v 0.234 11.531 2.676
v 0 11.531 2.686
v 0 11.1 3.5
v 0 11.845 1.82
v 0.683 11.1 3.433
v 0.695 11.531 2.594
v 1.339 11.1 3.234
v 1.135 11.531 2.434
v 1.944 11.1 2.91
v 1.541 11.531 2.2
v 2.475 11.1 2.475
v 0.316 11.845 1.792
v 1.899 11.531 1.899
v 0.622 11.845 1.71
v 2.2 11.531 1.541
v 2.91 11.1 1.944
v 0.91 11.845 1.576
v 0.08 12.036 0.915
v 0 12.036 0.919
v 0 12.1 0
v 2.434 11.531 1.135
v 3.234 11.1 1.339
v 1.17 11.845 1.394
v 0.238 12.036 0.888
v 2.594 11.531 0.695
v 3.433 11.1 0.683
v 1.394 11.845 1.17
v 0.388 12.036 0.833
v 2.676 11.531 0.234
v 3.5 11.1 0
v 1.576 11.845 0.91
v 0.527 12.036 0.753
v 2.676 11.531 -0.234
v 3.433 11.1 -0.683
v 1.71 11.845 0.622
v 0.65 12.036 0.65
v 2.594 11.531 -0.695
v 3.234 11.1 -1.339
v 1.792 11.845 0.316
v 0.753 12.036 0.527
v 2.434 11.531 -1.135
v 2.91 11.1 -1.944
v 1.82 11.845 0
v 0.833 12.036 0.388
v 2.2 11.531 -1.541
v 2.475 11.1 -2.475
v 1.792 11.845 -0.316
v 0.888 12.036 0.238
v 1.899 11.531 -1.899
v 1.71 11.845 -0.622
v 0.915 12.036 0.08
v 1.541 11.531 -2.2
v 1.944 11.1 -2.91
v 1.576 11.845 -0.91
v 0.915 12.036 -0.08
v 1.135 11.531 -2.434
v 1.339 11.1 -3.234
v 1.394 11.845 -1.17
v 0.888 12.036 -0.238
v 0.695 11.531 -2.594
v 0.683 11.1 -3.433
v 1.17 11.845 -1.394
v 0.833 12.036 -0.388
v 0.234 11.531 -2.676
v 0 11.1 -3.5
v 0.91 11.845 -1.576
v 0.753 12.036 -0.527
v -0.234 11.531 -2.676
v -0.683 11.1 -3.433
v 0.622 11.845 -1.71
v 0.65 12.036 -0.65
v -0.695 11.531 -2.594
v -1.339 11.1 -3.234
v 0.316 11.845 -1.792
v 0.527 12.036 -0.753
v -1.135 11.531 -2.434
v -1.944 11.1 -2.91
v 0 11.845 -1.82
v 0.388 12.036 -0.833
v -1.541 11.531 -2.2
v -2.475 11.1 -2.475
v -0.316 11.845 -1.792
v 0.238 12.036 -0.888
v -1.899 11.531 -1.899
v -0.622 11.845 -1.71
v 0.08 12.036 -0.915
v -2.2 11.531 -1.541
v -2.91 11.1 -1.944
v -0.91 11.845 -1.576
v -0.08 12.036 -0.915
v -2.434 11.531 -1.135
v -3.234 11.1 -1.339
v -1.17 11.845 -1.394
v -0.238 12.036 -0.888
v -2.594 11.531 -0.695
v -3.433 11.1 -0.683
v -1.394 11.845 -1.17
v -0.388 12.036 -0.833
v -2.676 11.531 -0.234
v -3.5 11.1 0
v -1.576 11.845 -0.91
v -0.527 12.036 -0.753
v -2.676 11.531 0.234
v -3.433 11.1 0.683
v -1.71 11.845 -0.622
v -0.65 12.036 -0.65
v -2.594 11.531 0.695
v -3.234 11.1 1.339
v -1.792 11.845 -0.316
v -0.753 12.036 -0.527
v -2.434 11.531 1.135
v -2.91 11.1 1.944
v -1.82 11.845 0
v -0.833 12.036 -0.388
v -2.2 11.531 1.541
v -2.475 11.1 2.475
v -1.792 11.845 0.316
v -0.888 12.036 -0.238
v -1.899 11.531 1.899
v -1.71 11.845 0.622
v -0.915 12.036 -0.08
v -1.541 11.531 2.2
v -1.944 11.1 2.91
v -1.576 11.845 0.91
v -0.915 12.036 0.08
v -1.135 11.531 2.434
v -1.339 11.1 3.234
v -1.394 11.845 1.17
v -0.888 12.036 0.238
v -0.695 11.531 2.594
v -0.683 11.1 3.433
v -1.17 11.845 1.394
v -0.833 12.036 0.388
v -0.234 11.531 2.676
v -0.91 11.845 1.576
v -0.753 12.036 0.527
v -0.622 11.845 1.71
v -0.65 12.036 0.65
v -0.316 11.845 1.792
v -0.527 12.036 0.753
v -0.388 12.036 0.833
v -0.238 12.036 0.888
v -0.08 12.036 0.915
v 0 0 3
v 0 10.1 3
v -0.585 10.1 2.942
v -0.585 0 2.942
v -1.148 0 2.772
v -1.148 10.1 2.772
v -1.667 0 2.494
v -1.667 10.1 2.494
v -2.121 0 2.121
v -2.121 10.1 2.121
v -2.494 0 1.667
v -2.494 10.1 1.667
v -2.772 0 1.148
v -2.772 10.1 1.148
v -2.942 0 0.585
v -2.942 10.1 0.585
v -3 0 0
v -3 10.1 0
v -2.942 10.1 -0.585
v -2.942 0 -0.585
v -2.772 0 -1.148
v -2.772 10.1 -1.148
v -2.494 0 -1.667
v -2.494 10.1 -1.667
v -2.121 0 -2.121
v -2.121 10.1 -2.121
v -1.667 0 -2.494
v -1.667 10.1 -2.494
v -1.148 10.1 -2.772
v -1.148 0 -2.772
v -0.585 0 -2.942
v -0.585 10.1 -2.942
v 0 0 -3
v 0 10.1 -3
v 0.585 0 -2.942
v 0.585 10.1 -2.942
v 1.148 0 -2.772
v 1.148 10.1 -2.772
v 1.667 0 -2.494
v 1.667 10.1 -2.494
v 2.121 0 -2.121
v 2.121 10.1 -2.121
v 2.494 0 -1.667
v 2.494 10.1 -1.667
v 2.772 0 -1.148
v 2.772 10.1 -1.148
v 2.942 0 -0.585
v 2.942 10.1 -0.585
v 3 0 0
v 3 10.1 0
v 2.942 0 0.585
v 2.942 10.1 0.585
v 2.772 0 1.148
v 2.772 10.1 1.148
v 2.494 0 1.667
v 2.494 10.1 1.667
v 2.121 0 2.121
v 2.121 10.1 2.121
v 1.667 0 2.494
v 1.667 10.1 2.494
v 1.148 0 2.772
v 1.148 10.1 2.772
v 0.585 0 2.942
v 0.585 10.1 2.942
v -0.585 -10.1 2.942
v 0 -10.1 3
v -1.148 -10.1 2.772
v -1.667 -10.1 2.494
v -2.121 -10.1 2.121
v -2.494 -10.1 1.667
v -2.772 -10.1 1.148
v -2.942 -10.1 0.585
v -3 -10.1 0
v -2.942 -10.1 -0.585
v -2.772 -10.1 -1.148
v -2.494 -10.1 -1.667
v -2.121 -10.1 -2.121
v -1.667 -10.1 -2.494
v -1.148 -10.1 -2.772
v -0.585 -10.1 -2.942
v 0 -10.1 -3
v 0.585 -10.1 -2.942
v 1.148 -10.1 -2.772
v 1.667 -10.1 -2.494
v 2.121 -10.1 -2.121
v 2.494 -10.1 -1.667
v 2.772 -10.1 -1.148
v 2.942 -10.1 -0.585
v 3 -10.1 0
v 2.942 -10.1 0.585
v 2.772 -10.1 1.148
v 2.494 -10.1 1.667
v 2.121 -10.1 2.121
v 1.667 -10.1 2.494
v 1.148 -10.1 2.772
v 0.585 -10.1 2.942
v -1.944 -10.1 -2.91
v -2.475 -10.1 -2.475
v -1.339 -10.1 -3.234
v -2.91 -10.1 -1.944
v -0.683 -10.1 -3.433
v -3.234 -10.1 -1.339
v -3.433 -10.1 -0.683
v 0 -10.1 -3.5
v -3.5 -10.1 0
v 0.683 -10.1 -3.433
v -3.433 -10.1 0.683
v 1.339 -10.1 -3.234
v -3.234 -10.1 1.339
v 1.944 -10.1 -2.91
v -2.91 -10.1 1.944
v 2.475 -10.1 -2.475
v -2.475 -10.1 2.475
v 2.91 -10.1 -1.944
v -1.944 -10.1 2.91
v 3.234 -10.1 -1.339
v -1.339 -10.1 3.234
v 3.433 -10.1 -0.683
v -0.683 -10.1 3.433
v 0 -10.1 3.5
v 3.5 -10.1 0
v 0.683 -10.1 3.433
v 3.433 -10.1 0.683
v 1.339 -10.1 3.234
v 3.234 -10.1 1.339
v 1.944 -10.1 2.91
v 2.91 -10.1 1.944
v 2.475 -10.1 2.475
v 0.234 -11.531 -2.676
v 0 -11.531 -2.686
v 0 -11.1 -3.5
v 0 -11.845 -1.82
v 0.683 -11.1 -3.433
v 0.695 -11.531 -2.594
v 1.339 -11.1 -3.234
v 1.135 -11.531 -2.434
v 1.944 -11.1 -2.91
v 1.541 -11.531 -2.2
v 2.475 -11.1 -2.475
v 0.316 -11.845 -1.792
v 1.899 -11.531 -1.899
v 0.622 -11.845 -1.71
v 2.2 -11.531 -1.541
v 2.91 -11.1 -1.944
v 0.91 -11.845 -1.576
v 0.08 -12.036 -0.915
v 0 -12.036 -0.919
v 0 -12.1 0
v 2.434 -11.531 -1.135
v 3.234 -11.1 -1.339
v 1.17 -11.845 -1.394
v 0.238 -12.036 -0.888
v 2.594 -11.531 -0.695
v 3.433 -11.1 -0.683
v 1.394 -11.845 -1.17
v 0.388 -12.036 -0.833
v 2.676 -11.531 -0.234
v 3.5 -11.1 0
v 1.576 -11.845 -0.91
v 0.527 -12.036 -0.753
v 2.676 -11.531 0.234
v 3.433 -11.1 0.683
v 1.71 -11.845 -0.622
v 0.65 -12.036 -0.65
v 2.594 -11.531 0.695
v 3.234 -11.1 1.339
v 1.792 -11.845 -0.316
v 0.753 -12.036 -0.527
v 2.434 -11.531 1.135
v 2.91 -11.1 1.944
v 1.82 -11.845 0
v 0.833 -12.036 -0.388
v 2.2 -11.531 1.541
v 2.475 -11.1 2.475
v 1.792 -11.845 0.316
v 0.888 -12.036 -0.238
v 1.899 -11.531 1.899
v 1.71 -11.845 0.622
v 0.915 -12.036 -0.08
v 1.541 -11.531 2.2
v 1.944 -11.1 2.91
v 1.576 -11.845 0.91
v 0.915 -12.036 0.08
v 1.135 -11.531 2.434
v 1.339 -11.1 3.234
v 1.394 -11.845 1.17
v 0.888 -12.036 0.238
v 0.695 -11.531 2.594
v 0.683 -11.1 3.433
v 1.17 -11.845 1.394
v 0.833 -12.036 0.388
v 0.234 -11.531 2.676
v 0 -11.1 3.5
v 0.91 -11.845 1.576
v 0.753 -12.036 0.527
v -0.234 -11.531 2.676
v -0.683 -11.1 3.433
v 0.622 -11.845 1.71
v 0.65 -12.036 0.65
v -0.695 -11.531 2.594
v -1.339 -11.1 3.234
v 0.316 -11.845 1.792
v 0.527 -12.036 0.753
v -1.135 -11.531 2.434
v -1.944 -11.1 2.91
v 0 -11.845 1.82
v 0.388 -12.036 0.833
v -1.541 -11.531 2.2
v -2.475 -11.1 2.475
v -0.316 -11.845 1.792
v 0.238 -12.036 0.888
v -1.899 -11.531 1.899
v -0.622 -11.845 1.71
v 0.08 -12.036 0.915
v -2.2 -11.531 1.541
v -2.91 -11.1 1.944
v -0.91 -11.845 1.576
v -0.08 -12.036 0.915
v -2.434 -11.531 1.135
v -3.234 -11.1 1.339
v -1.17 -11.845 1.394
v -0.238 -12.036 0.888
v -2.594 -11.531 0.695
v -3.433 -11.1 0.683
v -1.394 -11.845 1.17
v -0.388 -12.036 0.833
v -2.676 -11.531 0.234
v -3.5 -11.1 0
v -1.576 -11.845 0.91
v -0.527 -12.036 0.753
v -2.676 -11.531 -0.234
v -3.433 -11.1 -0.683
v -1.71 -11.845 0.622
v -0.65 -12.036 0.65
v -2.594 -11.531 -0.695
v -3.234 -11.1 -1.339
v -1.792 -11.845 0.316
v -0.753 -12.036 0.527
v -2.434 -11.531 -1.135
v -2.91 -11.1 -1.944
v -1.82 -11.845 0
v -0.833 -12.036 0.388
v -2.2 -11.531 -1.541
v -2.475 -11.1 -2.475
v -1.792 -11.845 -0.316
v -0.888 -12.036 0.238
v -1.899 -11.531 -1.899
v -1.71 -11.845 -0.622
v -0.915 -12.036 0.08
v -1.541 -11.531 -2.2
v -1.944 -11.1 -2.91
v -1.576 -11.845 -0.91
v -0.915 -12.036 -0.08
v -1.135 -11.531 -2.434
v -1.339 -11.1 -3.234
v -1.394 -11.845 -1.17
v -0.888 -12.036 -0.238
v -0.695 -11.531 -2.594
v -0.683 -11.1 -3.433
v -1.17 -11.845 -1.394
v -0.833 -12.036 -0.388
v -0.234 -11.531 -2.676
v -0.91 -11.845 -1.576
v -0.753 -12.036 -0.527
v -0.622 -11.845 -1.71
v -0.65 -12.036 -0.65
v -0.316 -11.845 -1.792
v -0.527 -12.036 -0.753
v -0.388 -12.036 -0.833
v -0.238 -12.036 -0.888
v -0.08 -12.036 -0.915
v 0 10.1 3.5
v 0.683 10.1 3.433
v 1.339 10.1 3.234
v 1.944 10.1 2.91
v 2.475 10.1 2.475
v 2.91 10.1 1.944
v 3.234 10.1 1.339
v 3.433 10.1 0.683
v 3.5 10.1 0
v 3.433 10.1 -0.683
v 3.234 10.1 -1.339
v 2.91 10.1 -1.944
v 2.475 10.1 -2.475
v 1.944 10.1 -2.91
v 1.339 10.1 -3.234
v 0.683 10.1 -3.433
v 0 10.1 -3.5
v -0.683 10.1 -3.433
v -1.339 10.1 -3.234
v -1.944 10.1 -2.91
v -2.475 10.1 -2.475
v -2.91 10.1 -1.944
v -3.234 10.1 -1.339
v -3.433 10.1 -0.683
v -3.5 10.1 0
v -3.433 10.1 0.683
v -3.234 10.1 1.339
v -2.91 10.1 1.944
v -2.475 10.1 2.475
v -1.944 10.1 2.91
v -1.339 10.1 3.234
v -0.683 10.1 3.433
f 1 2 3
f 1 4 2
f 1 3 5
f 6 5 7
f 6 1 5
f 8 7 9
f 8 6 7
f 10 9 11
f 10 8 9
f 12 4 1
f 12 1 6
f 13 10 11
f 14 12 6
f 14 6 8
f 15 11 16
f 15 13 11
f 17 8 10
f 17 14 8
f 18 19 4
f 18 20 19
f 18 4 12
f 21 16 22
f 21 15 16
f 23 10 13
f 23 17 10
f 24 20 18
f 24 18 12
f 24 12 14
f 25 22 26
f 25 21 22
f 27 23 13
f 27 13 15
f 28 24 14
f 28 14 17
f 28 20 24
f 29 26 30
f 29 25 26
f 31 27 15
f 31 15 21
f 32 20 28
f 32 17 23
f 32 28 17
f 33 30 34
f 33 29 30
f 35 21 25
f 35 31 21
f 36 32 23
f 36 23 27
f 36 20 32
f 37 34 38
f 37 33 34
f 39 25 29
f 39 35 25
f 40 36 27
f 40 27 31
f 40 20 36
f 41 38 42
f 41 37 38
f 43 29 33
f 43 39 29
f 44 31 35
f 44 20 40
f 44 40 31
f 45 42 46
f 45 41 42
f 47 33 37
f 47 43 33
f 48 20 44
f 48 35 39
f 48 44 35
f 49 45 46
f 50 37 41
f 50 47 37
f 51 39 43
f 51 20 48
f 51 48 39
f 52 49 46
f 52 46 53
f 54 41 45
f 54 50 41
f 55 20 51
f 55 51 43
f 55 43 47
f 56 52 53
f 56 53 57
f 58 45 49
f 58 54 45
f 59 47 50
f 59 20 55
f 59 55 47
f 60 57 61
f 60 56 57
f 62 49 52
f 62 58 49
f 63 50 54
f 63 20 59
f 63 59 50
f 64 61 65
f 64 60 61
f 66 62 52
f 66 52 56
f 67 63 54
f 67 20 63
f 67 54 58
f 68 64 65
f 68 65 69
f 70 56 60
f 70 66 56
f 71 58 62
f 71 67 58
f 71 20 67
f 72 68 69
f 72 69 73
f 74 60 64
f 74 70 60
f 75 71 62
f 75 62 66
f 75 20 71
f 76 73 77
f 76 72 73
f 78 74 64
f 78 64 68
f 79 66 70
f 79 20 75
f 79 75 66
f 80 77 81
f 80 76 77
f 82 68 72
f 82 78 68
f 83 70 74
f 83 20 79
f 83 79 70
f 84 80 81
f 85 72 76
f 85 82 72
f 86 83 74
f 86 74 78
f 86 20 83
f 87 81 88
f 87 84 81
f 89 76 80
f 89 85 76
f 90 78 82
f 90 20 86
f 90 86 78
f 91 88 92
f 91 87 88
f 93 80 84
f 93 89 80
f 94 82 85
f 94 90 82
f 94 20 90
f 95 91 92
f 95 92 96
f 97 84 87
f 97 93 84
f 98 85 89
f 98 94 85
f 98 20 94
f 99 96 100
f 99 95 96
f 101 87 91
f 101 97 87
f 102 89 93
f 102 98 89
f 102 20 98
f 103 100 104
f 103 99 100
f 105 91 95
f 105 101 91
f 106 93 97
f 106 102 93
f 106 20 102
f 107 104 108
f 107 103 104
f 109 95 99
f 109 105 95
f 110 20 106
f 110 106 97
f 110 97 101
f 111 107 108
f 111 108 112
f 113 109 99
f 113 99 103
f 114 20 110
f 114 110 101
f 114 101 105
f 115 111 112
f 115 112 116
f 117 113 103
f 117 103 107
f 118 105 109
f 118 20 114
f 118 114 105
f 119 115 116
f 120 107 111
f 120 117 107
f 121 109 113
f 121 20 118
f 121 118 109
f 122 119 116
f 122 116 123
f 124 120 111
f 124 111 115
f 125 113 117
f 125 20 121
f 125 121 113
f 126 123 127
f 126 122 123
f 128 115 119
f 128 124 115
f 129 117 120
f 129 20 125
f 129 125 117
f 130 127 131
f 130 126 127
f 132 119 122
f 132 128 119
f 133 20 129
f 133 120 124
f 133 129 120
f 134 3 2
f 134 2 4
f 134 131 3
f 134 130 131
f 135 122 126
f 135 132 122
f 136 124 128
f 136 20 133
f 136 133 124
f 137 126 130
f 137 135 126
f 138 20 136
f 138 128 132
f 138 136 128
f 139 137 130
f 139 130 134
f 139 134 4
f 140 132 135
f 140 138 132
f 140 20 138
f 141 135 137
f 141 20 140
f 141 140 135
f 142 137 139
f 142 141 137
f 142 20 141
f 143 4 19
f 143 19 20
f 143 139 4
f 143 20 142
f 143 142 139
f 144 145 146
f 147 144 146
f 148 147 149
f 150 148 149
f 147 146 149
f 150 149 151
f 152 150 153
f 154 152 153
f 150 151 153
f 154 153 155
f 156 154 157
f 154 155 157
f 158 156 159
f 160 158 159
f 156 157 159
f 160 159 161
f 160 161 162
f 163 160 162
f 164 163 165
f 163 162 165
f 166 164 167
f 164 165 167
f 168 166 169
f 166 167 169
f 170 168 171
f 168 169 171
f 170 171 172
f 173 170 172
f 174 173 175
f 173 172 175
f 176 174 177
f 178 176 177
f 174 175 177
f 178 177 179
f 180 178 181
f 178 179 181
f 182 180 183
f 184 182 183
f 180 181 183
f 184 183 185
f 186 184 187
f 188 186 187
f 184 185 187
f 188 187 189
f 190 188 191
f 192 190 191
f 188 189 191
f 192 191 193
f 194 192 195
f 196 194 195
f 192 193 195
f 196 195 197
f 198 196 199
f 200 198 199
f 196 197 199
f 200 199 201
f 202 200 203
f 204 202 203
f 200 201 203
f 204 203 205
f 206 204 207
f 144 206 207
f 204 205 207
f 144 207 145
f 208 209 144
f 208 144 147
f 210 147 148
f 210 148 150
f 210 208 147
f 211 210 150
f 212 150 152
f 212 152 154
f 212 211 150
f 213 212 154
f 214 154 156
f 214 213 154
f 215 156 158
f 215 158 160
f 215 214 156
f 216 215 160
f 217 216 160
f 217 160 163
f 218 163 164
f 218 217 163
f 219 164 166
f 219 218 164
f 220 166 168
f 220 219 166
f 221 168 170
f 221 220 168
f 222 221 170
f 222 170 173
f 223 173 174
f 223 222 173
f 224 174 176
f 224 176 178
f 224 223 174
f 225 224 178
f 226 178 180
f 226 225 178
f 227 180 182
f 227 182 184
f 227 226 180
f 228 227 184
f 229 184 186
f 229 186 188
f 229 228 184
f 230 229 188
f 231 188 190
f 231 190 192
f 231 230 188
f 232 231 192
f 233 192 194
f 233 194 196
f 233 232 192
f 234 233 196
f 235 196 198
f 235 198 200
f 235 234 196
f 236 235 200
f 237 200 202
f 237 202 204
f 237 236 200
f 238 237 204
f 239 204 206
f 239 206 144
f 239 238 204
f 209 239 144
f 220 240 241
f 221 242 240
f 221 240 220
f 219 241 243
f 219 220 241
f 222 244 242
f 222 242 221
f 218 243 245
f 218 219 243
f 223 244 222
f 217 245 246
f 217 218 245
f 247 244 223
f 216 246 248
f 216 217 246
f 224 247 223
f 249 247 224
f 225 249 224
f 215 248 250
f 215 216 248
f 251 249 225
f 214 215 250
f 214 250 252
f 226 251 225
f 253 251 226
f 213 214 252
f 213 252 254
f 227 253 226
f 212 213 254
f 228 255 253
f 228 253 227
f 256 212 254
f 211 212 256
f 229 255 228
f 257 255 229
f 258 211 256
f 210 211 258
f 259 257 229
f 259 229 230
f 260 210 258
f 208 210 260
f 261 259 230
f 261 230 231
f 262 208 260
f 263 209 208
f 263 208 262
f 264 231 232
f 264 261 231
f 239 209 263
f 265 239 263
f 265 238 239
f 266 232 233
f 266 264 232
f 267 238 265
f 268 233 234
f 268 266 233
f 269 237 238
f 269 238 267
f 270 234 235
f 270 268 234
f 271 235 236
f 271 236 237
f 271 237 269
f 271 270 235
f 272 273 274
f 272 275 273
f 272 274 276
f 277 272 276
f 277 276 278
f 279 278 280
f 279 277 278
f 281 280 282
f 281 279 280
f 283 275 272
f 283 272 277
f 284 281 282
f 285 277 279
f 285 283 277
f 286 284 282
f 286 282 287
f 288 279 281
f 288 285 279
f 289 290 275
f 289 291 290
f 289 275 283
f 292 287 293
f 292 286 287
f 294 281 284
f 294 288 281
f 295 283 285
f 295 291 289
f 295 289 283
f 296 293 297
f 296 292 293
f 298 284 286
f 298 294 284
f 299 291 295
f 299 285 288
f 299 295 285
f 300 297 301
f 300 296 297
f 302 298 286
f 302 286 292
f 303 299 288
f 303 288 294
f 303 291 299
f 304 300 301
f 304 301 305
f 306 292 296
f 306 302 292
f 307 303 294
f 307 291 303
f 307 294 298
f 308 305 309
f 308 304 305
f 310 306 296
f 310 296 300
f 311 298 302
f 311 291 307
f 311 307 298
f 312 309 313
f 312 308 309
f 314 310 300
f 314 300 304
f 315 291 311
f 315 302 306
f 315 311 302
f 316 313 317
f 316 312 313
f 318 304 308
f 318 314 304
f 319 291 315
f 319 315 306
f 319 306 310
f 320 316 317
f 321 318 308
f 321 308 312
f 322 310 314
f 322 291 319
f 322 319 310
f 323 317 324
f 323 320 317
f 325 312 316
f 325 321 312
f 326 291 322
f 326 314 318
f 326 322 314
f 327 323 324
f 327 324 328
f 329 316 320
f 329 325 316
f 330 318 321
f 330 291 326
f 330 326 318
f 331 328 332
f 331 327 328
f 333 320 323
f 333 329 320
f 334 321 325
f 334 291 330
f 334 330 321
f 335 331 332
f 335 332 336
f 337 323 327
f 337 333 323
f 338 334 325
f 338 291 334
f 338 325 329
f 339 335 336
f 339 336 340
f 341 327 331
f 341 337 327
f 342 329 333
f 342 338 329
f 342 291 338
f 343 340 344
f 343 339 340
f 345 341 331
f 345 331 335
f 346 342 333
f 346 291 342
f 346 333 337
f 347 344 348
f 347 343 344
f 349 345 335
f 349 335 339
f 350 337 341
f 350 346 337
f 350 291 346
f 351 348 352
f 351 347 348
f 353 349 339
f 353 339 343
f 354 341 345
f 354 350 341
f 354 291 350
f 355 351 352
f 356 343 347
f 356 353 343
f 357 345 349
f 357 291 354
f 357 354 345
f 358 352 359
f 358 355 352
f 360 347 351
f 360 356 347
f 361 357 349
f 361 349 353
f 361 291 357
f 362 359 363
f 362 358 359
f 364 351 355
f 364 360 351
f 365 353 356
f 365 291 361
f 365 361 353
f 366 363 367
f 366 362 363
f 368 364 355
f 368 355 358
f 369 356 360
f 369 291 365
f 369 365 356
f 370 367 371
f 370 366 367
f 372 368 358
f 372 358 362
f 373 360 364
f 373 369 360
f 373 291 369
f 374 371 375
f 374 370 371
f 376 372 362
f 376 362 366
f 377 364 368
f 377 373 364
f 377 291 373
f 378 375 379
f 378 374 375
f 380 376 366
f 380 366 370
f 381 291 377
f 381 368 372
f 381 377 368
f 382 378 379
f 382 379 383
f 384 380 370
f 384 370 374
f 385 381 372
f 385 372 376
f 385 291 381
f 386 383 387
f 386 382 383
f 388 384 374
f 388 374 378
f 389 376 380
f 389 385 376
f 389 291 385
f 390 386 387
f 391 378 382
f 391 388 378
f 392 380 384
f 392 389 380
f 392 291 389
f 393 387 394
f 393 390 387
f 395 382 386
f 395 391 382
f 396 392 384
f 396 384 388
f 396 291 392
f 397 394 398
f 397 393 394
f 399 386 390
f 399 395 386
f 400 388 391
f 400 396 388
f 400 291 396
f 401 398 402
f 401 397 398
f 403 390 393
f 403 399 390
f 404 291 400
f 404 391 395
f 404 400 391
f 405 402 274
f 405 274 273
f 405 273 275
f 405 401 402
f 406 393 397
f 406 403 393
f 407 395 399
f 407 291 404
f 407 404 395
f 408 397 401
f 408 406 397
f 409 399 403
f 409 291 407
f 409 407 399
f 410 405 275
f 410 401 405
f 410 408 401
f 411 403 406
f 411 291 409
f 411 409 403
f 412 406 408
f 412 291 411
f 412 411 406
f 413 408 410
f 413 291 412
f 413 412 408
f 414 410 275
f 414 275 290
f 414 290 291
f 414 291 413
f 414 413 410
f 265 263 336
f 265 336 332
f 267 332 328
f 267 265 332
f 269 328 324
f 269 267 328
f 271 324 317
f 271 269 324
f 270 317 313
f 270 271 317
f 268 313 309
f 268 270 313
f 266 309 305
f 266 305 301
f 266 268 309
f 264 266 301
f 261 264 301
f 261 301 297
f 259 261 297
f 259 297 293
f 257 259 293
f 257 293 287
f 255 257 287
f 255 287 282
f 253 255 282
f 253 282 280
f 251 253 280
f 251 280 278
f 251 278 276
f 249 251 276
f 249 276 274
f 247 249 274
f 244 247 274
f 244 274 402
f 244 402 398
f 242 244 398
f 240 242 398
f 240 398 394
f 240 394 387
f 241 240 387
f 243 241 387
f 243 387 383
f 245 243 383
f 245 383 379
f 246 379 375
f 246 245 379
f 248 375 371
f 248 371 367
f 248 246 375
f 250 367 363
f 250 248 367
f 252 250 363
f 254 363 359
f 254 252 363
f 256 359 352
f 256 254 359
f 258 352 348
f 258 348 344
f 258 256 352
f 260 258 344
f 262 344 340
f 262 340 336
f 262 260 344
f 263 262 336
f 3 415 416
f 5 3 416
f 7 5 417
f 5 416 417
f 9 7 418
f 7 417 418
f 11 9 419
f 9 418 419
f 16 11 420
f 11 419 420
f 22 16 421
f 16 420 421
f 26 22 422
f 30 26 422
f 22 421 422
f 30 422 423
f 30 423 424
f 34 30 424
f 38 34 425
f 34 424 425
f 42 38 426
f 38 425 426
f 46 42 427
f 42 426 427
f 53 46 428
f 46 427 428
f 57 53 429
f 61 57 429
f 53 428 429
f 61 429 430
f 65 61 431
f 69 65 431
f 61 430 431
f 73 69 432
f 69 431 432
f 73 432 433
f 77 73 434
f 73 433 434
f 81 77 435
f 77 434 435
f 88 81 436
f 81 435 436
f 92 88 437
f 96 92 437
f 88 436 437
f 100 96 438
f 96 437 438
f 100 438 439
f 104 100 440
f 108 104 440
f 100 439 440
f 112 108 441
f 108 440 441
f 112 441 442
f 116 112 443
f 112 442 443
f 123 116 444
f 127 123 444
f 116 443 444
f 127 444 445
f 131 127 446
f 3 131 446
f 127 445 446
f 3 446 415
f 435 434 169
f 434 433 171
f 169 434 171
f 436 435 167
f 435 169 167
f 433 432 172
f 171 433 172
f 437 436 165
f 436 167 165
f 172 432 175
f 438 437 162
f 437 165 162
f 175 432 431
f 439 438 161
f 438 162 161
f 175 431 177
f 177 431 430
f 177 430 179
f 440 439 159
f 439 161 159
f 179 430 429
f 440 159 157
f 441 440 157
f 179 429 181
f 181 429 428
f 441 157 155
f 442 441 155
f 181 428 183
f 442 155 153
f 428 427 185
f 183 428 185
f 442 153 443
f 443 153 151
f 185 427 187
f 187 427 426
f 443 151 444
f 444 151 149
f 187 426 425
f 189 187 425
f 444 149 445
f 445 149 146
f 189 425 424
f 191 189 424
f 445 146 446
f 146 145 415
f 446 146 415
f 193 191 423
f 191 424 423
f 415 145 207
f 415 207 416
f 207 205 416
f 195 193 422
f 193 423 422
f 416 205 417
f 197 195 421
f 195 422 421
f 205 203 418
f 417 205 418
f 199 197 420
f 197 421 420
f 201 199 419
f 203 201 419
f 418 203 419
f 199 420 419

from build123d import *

# Parameters (mm, degrees)
SKETCH1_W                  = 3
SKETCH1_H                  = 10.1
SKETCH2_R                  = 3.5
BOSS_EXTRUDE1_DEPTH        = 1
DOME1_FACE_RADIUS          = 3.5
DOME1_HEIGHT               = 1
MIRROR1_COPY_1_FACE_RADIUS = 3.5
MIRROR1_COPY_1_HEIGHT      = 1


with BuildPart() as part:
    # Sketch1 → Revolve1 (revolve)
    with BuildSketch(Plane.XY, mode=Mode.PRIVATE) as revolve1_sk:
        with Locations((-1.5, 5.05)):
            Rectangle(SKETCH1_W, SKETCH1_H)
    revolve1 = revolve(revolve1_sk.sketch.rotate(Axis((0, 5.950819672, 0), (0, -1, 0)), 270), axis=Axis((0, 5.950819672, 0), (0, -1, 0)))

    # Sketch2 → Boss-Extrude1 (add)
    with BuildSketch(Plane(origin=(0, 10.1, 0), x_dir=(1, 0, 0), z_dir=(0, 1, 0))):
        with Locations(Location((0, 0, 0), (0, 0, 270))):
            Circle(SKETCH2_R)
    boss_extrude1 = extrude(amount=BOSS_EXTRUDE1_DEPTH)

    # Dome1: a dome of height H over a round flat face of radius A is a cap of a sphere of radius (A * A + H * H) / (2 * H)
    dome1_r = (DOME1_FACE_RADIUS * DOME1_FACE_RADIUS + DOME1_HEIGHT * DOME1_HEIGHT) / (2 * DOME1_HEIGHT)
    dome1_base = Plane((0, 11.1, 0), z_dir=(0, 1, 0))
    with Locations(dome1_base.offset(DOME1_HEIGHT - dome1_r)):
        dome1_ball = Sphere(dome1_r, mode=Mode.PRIVATE)
    add(split(dome1_ball, bisect_by=dome1_base, keep=Keep.TOP, mode=Mode.PRIVATE))

    # Mirror1: Revolve1, Boss-Extrude1 across plane
    add(revolve1.mirror(Plane.ZX))
    add(boss_extrude1.mirror(Plane.ZX))

    # Mirror1 copy 1: a dome of height H over a round flat face of radius A is a cap of a sphere of radius (A * A + H * H) / (2 * H)
    mirror1_copy_1_r = (MIRROR1_COPY_1_FACE_RADIUS * MIRROR1_COPY_1_FACE_RADIUS + MIRROR1_COPY_1_HEIGHT * MIRROR1_COPY_1_HEIGHT) / (2 * MIRROR1_COPY_1_HEIGHT)
    mirror1_copy_1_base = Plane((0, -11.1, 0), z_dir=(0, -1, 0))
    with Locations(mirror1_copy_1_base.offset(MIRROR1_COPY_1_HEIGHT - mirror1_copy_1_r)):
        mirror1_copy_1_ball = Sphere(mirror1_copy_1_r, mode=Mode.PRIVATE)
    add(split(mirror1_copy_1_ball, bisect_by=mirror1_copy_1_base, keep=Keep.TOP, mode=Mode.PRIVATE))


solid = part.part
